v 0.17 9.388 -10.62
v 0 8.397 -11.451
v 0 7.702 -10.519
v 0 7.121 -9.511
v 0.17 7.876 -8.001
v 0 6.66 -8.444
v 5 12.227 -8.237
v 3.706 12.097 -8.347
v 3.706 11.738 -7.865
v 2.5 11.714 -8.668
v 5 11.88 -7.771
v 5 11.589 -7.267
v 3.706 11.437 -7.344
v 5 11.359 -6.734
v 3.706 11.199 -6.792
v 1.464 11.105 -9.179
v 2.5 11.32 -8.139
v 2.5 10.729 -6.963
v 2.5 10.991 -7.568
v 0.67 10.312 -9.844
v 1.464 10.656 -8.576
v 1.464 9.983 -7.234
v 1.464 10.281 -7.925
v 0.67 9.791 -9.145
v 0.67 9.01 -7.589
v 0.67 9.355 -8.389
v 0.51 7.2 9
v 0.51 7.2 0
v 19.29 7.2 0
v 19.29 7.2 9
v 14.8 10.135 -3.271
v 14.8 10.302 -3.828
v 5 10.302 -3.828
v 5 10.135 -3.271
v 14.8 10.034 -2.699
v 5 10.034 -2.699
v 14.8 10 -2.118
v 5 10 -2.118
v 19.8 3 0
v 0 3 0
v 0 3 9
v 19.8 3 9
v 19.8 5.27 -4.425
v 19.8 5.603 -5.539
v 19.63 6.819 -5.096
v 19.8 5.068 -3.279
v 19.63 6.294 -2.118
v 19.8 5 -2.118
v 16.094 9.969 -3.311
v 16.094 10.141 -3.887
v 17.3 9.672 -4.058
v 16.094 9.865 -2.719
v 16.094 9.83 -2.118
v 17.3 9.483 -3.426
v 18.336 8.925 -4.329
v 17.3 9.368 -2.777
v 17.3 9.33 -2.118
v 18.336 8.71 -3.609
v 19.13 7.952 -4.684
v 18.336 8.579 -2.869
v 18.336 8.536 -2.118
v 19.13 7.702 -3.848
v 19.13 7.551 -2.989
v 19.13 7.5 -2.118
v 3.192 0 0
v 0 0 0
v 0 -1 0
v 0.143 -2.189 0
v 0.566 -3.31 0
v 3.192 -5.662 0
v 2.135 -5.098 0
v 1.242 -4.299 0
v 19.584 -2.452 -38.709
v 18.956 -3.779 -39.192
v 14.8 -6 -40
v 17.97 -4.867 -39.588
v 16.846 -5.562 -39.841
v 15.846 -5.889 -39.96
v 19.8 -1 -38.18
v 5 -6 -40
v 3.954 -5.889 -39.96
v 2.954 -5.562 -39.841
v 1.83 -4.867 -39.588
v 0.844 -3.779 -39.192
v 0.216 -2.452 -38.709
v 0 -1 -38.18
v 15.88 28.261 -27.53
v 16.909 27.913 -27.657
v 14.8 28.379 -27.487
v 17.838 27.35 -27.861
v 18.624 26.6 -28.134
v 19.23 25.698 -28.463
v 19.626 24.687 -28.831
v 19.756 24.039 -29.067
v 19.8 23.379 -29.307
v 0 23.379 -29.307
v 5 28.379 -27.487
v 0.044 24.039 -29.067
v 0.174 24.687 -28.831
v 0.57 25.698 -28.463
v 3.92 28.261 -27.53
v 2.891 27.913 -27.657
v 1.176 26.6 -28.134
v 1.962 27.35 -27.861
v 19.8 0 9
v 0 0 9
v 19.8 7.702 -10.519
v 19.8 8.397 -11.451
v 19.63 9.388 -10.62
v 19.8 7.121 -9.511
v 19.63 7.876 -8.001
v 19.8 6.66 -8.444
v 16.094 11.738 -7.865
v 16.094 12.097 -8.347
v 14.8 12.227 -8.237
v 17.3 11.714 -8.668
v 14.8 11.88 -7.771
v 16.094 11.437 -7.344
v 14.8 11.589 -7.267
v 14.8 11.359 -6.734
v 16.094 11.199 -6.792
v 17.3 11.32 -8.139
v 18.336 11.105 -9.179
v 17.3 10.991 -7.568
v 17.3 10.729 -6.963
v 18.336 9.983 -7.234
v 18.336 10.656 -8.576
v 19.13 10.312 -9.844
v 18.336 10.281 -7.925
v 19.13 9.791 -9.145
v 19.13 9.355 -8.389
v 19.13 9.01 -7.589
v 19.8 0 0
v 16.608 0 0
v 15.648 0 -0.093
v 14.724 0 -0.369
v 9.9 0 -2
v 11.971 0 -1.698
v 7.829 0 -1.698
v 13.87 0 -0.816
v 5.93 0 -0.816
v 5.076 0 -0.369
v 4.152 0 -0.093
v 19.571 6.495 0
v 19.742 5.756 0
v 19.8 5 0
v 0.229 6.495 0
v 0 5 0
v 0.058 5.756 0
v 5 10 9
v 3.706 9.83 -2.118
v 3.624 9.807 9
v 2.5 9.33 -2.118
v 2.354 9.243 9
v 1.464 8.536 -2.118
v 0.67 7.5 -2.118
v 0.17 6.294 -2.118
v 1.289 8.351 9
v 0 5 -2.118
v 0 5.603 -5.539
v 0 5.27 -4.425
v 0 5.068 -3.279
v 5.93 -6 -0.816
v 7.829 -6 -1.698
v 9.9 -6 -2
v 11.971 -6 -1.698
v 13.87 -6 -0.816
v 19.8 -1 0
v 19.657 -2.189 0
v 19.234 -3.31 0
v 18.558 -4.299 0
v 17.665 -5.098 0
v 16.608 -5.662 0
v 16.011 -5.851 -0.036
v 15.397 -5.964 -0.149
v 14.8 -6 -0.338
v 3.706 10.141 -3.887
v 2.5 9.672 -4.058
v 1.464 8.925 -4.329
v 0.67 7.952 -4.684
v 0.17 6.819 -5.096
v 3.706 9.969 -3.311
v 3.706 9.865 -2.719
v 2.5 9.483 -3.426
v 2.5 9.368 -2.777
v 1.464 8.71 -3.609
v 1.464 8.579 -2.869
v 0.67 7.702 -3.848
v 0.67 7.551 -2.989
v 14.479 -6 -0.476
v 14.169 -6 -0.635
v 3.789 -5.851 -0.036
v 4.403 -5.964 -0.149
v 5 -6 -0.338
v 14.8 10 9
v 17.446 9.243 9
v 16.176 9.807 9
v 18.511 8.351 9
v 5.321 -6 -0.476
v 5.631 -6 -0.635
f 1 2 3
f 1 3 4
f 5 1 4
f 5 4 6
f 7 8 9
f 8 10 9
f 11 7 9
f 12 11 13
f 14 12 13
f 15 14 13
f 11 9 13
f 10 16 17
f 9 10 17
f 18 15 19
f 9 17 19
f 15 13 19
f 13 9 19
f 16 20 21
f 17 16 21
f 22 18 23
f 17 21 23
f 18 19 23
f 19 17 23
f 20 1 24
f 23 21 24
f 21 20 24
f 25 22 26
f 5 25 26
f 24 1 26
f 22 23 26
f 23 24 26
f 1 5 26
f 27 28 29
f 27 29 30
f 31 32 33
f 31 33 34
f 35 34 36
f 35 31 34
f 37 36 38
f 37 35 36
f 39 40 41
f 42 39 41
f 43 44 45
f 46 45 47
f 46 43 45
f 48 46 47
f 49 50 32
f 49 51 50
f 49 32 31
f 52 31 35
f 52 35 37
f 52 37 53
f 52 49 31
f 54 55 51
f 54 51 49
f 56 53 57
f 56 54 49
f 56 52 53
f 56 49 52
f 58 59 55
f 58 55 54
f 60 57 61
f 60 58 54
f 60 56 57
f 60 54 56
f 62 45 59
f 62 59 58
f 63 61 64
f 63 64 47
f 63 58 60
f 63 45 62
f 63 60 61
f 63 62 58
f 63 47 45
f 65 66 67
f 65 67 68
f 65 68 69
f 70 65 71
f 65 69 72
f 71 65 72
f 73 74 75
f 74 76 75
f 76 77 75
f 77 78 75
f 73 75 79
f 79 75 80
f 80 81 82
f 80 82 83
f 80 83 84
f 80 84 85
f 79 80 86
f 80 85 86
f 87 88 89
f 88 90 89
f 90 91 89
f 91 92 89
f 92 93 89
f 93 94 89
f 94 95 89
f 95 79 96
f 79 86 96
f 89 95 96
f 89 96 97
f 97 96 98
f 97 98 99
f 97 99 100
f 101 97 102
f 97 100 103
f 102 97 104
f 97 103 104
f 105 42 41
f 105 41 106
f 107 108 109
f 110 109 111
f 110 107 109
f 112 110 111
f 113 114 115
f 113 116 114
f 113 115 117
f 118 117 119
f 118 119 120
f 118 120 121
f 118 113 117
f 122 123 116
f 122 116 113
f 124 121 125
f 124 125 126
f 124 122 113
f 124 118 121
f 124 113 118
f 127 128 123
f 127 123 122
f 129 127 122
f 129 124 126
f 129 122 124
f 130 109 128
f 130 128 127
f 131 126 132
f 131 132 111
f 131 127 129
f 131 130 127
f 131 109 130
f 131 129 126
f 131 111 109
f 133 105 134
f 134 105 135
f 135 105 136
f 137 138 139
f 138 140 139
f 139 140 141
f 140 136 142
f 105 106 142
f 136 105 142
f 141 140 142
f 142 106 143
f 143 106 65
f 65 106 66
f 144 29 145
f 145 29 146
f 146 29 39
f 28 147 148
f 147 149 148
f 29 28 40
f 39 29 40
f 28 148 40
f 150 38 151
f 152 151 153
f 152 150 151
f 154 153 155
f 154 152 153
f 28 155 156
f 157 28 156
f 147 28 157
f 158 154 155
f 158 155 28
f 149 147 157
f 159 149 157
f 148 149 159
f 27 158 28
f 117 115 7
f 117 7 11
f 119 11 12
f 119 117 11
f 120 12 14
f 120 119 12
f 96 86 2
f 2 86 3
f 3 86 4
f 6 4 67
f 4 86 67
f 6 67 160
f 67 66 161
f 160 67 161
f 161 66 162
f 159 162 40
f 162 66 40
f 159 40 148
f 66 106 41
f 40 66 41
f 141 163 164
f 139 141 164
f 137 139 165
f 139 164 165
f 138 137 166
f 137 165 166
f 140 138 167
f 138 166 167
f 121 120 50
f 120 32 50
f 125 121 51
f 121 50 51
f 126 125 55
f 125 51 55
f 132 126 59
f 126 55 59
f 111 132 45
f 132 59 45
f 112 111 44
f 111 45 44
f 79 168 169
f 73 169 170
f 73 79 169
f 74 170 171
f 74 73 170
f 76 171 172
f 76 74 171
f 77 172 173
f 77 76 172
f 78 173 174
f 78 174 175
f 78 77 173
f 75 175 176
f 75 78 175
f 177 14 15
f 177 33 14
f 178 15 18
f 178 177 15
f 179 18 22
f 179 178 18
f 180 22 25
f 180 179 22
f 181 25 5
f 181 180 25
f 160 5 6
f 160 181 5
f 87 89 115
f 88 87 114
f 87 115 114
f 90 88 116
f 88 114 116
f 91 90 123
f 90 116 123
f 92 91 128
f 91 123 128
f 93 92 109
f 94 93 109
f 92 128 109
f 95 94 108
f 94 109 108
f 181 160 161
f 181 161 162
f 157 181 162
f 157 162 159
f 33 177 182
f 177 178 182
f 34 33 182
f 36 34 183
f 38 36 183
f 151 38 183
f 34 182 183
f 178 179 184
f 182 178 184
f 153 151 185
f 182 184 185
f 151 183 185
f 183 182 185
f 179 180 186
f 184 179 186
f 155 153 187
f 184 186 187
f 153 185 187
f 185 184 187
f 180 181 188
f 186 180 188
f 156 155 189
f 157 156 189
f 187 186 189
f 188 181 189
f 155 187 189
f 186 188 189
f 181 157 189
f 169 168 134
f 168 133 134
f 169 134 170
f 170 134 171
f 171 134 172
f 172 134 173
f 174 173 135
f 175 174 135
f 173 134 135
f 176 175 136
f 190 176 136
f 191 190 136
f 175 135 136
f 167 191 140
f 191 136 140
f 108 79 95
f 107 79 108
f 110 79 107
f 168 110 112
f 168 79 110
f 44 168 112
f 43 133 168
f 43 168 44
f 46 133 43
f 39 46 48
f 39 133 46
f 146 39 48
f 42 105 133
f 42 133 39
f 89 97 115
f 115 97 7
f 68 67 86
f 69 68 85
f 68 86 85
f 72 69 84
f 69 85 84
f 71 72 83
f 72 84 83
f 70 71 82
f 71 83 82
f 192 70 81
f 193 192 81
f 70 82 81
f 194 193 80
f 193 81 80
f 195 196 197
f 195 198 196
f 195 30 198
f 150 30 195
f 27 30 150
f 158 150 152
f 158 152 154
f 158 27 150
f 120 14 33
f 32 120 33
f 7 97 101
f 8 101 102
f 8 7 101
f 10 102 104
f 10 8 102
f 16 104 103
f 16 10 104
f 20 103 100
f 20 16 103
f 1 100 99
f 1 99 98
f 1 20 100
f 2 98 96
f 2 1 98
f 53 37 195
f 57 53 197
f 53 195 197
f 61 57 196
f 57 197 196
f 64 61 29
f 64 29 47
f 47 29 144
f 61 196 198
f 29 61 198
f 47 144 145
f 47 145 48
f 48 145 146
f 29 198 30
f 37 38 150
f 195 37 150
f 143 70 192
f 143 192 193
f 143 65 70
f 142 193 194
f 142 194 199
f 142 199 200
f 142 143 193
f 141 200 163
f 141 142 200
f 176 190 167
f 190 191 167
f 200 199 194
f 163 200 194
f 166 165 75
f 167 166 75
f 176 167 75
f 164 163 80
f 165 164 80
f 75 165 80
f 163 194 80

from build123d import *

# Parameters (mm, degrees)
F0_W     = 2.8
F0_H     = 9
F1_DEPTH = 19.8
F3_F1_R  = 5
F3_F2_R  = 5
F4_DEPTH = 6
F5_R     = 5


# Not quite as in the source:
# - a feature of the source that left no trace in its solid (it failed there, or was rolled back) is left out


with BuildPart() as f1:
    # F0 (on Right) → F1 (new body)
    with BuildSketch(Plane.YZ):
        Polygon((0, 9), (0, 0), (3, 0), (3, 2.7590821834), (3, 9), align=None)
        with Locations((8.6, 4.5)):
            Rectangle(F0_W, F0_H)
        Polygon((3, 0), (0, 0), (0, -3), (7.832443736, -3), (5.3151448425, 0), align=None)
        Polygon((7.2, 0), (5.3151448425, 0), (7.832443736, -3), (10, -3), (10, 0), align=None)
        Polygon((0, -3), (0, 0), (-6, 0), (-6, -40), (20.0199263242, -30.5295213202), (11.6604444312, -7.562033581), (7.832443736, -3), align=None)
        Polygon((10, -3), (7.832443736, -3), (11.6604444312, -7.562033581), align=None)
        Polygon((28.3794082171, -27.4869187373), (11.6604444312, -7.562033581), (20.0199263242, -30.5295213202), align=None)
    extrude(amount=F1_DEPTH)

    # F3: fillet of radius 5 on 6 edges, made by hand

    # F3_f1
    f3_f1_edges = [f1.edges().sort_by_distance(p)[0] for p in [
        (9.9, 10, -3),
        (9.9, 11.6604444312, -7.562033581),
    ]]
    fillet(f3_f1_edges, radius=F3_F1_R)

    # F3_f2
    f3_f2_edges = [f1.edges().sort_by_distance(p)[0] for p in [
        (0, -6, -20),
        (19.8, -6, -20),
        (19.8, 20.3032783203, -17.8621619185),
        (0, 20.3032783203, -17.8621619185),
        (0, 11.7272436201, -7.5234670512),
        (19.8, 11.7272436201, -7.5234670512),
    ]]
    fillet(f3_f2_edges, radius=F3_F2_R)

    # F2 (on face) → F4 (cut, through all)
    with BuildSketch(Plane.XZ.offset(6)):
        with BuildLine():
            ThreePointArc((4.9, 0), (9.9, -2), (14.9, 0))
            Line((14.9, 0), (4.9, 0))
        make_face()
    extrude(amount=-F4_DEPTH, mode=Mode.SUBTRACT)

    # F5
    f5_edges = [f1.edges().sort_by_distance(p)[0] for p in [
        (14.9, -2.9995, 0),
        (4.9, -2.9995, 0),
    ]]
    fillet(f5_edges, radius=F5_R)


solid = f1.part
